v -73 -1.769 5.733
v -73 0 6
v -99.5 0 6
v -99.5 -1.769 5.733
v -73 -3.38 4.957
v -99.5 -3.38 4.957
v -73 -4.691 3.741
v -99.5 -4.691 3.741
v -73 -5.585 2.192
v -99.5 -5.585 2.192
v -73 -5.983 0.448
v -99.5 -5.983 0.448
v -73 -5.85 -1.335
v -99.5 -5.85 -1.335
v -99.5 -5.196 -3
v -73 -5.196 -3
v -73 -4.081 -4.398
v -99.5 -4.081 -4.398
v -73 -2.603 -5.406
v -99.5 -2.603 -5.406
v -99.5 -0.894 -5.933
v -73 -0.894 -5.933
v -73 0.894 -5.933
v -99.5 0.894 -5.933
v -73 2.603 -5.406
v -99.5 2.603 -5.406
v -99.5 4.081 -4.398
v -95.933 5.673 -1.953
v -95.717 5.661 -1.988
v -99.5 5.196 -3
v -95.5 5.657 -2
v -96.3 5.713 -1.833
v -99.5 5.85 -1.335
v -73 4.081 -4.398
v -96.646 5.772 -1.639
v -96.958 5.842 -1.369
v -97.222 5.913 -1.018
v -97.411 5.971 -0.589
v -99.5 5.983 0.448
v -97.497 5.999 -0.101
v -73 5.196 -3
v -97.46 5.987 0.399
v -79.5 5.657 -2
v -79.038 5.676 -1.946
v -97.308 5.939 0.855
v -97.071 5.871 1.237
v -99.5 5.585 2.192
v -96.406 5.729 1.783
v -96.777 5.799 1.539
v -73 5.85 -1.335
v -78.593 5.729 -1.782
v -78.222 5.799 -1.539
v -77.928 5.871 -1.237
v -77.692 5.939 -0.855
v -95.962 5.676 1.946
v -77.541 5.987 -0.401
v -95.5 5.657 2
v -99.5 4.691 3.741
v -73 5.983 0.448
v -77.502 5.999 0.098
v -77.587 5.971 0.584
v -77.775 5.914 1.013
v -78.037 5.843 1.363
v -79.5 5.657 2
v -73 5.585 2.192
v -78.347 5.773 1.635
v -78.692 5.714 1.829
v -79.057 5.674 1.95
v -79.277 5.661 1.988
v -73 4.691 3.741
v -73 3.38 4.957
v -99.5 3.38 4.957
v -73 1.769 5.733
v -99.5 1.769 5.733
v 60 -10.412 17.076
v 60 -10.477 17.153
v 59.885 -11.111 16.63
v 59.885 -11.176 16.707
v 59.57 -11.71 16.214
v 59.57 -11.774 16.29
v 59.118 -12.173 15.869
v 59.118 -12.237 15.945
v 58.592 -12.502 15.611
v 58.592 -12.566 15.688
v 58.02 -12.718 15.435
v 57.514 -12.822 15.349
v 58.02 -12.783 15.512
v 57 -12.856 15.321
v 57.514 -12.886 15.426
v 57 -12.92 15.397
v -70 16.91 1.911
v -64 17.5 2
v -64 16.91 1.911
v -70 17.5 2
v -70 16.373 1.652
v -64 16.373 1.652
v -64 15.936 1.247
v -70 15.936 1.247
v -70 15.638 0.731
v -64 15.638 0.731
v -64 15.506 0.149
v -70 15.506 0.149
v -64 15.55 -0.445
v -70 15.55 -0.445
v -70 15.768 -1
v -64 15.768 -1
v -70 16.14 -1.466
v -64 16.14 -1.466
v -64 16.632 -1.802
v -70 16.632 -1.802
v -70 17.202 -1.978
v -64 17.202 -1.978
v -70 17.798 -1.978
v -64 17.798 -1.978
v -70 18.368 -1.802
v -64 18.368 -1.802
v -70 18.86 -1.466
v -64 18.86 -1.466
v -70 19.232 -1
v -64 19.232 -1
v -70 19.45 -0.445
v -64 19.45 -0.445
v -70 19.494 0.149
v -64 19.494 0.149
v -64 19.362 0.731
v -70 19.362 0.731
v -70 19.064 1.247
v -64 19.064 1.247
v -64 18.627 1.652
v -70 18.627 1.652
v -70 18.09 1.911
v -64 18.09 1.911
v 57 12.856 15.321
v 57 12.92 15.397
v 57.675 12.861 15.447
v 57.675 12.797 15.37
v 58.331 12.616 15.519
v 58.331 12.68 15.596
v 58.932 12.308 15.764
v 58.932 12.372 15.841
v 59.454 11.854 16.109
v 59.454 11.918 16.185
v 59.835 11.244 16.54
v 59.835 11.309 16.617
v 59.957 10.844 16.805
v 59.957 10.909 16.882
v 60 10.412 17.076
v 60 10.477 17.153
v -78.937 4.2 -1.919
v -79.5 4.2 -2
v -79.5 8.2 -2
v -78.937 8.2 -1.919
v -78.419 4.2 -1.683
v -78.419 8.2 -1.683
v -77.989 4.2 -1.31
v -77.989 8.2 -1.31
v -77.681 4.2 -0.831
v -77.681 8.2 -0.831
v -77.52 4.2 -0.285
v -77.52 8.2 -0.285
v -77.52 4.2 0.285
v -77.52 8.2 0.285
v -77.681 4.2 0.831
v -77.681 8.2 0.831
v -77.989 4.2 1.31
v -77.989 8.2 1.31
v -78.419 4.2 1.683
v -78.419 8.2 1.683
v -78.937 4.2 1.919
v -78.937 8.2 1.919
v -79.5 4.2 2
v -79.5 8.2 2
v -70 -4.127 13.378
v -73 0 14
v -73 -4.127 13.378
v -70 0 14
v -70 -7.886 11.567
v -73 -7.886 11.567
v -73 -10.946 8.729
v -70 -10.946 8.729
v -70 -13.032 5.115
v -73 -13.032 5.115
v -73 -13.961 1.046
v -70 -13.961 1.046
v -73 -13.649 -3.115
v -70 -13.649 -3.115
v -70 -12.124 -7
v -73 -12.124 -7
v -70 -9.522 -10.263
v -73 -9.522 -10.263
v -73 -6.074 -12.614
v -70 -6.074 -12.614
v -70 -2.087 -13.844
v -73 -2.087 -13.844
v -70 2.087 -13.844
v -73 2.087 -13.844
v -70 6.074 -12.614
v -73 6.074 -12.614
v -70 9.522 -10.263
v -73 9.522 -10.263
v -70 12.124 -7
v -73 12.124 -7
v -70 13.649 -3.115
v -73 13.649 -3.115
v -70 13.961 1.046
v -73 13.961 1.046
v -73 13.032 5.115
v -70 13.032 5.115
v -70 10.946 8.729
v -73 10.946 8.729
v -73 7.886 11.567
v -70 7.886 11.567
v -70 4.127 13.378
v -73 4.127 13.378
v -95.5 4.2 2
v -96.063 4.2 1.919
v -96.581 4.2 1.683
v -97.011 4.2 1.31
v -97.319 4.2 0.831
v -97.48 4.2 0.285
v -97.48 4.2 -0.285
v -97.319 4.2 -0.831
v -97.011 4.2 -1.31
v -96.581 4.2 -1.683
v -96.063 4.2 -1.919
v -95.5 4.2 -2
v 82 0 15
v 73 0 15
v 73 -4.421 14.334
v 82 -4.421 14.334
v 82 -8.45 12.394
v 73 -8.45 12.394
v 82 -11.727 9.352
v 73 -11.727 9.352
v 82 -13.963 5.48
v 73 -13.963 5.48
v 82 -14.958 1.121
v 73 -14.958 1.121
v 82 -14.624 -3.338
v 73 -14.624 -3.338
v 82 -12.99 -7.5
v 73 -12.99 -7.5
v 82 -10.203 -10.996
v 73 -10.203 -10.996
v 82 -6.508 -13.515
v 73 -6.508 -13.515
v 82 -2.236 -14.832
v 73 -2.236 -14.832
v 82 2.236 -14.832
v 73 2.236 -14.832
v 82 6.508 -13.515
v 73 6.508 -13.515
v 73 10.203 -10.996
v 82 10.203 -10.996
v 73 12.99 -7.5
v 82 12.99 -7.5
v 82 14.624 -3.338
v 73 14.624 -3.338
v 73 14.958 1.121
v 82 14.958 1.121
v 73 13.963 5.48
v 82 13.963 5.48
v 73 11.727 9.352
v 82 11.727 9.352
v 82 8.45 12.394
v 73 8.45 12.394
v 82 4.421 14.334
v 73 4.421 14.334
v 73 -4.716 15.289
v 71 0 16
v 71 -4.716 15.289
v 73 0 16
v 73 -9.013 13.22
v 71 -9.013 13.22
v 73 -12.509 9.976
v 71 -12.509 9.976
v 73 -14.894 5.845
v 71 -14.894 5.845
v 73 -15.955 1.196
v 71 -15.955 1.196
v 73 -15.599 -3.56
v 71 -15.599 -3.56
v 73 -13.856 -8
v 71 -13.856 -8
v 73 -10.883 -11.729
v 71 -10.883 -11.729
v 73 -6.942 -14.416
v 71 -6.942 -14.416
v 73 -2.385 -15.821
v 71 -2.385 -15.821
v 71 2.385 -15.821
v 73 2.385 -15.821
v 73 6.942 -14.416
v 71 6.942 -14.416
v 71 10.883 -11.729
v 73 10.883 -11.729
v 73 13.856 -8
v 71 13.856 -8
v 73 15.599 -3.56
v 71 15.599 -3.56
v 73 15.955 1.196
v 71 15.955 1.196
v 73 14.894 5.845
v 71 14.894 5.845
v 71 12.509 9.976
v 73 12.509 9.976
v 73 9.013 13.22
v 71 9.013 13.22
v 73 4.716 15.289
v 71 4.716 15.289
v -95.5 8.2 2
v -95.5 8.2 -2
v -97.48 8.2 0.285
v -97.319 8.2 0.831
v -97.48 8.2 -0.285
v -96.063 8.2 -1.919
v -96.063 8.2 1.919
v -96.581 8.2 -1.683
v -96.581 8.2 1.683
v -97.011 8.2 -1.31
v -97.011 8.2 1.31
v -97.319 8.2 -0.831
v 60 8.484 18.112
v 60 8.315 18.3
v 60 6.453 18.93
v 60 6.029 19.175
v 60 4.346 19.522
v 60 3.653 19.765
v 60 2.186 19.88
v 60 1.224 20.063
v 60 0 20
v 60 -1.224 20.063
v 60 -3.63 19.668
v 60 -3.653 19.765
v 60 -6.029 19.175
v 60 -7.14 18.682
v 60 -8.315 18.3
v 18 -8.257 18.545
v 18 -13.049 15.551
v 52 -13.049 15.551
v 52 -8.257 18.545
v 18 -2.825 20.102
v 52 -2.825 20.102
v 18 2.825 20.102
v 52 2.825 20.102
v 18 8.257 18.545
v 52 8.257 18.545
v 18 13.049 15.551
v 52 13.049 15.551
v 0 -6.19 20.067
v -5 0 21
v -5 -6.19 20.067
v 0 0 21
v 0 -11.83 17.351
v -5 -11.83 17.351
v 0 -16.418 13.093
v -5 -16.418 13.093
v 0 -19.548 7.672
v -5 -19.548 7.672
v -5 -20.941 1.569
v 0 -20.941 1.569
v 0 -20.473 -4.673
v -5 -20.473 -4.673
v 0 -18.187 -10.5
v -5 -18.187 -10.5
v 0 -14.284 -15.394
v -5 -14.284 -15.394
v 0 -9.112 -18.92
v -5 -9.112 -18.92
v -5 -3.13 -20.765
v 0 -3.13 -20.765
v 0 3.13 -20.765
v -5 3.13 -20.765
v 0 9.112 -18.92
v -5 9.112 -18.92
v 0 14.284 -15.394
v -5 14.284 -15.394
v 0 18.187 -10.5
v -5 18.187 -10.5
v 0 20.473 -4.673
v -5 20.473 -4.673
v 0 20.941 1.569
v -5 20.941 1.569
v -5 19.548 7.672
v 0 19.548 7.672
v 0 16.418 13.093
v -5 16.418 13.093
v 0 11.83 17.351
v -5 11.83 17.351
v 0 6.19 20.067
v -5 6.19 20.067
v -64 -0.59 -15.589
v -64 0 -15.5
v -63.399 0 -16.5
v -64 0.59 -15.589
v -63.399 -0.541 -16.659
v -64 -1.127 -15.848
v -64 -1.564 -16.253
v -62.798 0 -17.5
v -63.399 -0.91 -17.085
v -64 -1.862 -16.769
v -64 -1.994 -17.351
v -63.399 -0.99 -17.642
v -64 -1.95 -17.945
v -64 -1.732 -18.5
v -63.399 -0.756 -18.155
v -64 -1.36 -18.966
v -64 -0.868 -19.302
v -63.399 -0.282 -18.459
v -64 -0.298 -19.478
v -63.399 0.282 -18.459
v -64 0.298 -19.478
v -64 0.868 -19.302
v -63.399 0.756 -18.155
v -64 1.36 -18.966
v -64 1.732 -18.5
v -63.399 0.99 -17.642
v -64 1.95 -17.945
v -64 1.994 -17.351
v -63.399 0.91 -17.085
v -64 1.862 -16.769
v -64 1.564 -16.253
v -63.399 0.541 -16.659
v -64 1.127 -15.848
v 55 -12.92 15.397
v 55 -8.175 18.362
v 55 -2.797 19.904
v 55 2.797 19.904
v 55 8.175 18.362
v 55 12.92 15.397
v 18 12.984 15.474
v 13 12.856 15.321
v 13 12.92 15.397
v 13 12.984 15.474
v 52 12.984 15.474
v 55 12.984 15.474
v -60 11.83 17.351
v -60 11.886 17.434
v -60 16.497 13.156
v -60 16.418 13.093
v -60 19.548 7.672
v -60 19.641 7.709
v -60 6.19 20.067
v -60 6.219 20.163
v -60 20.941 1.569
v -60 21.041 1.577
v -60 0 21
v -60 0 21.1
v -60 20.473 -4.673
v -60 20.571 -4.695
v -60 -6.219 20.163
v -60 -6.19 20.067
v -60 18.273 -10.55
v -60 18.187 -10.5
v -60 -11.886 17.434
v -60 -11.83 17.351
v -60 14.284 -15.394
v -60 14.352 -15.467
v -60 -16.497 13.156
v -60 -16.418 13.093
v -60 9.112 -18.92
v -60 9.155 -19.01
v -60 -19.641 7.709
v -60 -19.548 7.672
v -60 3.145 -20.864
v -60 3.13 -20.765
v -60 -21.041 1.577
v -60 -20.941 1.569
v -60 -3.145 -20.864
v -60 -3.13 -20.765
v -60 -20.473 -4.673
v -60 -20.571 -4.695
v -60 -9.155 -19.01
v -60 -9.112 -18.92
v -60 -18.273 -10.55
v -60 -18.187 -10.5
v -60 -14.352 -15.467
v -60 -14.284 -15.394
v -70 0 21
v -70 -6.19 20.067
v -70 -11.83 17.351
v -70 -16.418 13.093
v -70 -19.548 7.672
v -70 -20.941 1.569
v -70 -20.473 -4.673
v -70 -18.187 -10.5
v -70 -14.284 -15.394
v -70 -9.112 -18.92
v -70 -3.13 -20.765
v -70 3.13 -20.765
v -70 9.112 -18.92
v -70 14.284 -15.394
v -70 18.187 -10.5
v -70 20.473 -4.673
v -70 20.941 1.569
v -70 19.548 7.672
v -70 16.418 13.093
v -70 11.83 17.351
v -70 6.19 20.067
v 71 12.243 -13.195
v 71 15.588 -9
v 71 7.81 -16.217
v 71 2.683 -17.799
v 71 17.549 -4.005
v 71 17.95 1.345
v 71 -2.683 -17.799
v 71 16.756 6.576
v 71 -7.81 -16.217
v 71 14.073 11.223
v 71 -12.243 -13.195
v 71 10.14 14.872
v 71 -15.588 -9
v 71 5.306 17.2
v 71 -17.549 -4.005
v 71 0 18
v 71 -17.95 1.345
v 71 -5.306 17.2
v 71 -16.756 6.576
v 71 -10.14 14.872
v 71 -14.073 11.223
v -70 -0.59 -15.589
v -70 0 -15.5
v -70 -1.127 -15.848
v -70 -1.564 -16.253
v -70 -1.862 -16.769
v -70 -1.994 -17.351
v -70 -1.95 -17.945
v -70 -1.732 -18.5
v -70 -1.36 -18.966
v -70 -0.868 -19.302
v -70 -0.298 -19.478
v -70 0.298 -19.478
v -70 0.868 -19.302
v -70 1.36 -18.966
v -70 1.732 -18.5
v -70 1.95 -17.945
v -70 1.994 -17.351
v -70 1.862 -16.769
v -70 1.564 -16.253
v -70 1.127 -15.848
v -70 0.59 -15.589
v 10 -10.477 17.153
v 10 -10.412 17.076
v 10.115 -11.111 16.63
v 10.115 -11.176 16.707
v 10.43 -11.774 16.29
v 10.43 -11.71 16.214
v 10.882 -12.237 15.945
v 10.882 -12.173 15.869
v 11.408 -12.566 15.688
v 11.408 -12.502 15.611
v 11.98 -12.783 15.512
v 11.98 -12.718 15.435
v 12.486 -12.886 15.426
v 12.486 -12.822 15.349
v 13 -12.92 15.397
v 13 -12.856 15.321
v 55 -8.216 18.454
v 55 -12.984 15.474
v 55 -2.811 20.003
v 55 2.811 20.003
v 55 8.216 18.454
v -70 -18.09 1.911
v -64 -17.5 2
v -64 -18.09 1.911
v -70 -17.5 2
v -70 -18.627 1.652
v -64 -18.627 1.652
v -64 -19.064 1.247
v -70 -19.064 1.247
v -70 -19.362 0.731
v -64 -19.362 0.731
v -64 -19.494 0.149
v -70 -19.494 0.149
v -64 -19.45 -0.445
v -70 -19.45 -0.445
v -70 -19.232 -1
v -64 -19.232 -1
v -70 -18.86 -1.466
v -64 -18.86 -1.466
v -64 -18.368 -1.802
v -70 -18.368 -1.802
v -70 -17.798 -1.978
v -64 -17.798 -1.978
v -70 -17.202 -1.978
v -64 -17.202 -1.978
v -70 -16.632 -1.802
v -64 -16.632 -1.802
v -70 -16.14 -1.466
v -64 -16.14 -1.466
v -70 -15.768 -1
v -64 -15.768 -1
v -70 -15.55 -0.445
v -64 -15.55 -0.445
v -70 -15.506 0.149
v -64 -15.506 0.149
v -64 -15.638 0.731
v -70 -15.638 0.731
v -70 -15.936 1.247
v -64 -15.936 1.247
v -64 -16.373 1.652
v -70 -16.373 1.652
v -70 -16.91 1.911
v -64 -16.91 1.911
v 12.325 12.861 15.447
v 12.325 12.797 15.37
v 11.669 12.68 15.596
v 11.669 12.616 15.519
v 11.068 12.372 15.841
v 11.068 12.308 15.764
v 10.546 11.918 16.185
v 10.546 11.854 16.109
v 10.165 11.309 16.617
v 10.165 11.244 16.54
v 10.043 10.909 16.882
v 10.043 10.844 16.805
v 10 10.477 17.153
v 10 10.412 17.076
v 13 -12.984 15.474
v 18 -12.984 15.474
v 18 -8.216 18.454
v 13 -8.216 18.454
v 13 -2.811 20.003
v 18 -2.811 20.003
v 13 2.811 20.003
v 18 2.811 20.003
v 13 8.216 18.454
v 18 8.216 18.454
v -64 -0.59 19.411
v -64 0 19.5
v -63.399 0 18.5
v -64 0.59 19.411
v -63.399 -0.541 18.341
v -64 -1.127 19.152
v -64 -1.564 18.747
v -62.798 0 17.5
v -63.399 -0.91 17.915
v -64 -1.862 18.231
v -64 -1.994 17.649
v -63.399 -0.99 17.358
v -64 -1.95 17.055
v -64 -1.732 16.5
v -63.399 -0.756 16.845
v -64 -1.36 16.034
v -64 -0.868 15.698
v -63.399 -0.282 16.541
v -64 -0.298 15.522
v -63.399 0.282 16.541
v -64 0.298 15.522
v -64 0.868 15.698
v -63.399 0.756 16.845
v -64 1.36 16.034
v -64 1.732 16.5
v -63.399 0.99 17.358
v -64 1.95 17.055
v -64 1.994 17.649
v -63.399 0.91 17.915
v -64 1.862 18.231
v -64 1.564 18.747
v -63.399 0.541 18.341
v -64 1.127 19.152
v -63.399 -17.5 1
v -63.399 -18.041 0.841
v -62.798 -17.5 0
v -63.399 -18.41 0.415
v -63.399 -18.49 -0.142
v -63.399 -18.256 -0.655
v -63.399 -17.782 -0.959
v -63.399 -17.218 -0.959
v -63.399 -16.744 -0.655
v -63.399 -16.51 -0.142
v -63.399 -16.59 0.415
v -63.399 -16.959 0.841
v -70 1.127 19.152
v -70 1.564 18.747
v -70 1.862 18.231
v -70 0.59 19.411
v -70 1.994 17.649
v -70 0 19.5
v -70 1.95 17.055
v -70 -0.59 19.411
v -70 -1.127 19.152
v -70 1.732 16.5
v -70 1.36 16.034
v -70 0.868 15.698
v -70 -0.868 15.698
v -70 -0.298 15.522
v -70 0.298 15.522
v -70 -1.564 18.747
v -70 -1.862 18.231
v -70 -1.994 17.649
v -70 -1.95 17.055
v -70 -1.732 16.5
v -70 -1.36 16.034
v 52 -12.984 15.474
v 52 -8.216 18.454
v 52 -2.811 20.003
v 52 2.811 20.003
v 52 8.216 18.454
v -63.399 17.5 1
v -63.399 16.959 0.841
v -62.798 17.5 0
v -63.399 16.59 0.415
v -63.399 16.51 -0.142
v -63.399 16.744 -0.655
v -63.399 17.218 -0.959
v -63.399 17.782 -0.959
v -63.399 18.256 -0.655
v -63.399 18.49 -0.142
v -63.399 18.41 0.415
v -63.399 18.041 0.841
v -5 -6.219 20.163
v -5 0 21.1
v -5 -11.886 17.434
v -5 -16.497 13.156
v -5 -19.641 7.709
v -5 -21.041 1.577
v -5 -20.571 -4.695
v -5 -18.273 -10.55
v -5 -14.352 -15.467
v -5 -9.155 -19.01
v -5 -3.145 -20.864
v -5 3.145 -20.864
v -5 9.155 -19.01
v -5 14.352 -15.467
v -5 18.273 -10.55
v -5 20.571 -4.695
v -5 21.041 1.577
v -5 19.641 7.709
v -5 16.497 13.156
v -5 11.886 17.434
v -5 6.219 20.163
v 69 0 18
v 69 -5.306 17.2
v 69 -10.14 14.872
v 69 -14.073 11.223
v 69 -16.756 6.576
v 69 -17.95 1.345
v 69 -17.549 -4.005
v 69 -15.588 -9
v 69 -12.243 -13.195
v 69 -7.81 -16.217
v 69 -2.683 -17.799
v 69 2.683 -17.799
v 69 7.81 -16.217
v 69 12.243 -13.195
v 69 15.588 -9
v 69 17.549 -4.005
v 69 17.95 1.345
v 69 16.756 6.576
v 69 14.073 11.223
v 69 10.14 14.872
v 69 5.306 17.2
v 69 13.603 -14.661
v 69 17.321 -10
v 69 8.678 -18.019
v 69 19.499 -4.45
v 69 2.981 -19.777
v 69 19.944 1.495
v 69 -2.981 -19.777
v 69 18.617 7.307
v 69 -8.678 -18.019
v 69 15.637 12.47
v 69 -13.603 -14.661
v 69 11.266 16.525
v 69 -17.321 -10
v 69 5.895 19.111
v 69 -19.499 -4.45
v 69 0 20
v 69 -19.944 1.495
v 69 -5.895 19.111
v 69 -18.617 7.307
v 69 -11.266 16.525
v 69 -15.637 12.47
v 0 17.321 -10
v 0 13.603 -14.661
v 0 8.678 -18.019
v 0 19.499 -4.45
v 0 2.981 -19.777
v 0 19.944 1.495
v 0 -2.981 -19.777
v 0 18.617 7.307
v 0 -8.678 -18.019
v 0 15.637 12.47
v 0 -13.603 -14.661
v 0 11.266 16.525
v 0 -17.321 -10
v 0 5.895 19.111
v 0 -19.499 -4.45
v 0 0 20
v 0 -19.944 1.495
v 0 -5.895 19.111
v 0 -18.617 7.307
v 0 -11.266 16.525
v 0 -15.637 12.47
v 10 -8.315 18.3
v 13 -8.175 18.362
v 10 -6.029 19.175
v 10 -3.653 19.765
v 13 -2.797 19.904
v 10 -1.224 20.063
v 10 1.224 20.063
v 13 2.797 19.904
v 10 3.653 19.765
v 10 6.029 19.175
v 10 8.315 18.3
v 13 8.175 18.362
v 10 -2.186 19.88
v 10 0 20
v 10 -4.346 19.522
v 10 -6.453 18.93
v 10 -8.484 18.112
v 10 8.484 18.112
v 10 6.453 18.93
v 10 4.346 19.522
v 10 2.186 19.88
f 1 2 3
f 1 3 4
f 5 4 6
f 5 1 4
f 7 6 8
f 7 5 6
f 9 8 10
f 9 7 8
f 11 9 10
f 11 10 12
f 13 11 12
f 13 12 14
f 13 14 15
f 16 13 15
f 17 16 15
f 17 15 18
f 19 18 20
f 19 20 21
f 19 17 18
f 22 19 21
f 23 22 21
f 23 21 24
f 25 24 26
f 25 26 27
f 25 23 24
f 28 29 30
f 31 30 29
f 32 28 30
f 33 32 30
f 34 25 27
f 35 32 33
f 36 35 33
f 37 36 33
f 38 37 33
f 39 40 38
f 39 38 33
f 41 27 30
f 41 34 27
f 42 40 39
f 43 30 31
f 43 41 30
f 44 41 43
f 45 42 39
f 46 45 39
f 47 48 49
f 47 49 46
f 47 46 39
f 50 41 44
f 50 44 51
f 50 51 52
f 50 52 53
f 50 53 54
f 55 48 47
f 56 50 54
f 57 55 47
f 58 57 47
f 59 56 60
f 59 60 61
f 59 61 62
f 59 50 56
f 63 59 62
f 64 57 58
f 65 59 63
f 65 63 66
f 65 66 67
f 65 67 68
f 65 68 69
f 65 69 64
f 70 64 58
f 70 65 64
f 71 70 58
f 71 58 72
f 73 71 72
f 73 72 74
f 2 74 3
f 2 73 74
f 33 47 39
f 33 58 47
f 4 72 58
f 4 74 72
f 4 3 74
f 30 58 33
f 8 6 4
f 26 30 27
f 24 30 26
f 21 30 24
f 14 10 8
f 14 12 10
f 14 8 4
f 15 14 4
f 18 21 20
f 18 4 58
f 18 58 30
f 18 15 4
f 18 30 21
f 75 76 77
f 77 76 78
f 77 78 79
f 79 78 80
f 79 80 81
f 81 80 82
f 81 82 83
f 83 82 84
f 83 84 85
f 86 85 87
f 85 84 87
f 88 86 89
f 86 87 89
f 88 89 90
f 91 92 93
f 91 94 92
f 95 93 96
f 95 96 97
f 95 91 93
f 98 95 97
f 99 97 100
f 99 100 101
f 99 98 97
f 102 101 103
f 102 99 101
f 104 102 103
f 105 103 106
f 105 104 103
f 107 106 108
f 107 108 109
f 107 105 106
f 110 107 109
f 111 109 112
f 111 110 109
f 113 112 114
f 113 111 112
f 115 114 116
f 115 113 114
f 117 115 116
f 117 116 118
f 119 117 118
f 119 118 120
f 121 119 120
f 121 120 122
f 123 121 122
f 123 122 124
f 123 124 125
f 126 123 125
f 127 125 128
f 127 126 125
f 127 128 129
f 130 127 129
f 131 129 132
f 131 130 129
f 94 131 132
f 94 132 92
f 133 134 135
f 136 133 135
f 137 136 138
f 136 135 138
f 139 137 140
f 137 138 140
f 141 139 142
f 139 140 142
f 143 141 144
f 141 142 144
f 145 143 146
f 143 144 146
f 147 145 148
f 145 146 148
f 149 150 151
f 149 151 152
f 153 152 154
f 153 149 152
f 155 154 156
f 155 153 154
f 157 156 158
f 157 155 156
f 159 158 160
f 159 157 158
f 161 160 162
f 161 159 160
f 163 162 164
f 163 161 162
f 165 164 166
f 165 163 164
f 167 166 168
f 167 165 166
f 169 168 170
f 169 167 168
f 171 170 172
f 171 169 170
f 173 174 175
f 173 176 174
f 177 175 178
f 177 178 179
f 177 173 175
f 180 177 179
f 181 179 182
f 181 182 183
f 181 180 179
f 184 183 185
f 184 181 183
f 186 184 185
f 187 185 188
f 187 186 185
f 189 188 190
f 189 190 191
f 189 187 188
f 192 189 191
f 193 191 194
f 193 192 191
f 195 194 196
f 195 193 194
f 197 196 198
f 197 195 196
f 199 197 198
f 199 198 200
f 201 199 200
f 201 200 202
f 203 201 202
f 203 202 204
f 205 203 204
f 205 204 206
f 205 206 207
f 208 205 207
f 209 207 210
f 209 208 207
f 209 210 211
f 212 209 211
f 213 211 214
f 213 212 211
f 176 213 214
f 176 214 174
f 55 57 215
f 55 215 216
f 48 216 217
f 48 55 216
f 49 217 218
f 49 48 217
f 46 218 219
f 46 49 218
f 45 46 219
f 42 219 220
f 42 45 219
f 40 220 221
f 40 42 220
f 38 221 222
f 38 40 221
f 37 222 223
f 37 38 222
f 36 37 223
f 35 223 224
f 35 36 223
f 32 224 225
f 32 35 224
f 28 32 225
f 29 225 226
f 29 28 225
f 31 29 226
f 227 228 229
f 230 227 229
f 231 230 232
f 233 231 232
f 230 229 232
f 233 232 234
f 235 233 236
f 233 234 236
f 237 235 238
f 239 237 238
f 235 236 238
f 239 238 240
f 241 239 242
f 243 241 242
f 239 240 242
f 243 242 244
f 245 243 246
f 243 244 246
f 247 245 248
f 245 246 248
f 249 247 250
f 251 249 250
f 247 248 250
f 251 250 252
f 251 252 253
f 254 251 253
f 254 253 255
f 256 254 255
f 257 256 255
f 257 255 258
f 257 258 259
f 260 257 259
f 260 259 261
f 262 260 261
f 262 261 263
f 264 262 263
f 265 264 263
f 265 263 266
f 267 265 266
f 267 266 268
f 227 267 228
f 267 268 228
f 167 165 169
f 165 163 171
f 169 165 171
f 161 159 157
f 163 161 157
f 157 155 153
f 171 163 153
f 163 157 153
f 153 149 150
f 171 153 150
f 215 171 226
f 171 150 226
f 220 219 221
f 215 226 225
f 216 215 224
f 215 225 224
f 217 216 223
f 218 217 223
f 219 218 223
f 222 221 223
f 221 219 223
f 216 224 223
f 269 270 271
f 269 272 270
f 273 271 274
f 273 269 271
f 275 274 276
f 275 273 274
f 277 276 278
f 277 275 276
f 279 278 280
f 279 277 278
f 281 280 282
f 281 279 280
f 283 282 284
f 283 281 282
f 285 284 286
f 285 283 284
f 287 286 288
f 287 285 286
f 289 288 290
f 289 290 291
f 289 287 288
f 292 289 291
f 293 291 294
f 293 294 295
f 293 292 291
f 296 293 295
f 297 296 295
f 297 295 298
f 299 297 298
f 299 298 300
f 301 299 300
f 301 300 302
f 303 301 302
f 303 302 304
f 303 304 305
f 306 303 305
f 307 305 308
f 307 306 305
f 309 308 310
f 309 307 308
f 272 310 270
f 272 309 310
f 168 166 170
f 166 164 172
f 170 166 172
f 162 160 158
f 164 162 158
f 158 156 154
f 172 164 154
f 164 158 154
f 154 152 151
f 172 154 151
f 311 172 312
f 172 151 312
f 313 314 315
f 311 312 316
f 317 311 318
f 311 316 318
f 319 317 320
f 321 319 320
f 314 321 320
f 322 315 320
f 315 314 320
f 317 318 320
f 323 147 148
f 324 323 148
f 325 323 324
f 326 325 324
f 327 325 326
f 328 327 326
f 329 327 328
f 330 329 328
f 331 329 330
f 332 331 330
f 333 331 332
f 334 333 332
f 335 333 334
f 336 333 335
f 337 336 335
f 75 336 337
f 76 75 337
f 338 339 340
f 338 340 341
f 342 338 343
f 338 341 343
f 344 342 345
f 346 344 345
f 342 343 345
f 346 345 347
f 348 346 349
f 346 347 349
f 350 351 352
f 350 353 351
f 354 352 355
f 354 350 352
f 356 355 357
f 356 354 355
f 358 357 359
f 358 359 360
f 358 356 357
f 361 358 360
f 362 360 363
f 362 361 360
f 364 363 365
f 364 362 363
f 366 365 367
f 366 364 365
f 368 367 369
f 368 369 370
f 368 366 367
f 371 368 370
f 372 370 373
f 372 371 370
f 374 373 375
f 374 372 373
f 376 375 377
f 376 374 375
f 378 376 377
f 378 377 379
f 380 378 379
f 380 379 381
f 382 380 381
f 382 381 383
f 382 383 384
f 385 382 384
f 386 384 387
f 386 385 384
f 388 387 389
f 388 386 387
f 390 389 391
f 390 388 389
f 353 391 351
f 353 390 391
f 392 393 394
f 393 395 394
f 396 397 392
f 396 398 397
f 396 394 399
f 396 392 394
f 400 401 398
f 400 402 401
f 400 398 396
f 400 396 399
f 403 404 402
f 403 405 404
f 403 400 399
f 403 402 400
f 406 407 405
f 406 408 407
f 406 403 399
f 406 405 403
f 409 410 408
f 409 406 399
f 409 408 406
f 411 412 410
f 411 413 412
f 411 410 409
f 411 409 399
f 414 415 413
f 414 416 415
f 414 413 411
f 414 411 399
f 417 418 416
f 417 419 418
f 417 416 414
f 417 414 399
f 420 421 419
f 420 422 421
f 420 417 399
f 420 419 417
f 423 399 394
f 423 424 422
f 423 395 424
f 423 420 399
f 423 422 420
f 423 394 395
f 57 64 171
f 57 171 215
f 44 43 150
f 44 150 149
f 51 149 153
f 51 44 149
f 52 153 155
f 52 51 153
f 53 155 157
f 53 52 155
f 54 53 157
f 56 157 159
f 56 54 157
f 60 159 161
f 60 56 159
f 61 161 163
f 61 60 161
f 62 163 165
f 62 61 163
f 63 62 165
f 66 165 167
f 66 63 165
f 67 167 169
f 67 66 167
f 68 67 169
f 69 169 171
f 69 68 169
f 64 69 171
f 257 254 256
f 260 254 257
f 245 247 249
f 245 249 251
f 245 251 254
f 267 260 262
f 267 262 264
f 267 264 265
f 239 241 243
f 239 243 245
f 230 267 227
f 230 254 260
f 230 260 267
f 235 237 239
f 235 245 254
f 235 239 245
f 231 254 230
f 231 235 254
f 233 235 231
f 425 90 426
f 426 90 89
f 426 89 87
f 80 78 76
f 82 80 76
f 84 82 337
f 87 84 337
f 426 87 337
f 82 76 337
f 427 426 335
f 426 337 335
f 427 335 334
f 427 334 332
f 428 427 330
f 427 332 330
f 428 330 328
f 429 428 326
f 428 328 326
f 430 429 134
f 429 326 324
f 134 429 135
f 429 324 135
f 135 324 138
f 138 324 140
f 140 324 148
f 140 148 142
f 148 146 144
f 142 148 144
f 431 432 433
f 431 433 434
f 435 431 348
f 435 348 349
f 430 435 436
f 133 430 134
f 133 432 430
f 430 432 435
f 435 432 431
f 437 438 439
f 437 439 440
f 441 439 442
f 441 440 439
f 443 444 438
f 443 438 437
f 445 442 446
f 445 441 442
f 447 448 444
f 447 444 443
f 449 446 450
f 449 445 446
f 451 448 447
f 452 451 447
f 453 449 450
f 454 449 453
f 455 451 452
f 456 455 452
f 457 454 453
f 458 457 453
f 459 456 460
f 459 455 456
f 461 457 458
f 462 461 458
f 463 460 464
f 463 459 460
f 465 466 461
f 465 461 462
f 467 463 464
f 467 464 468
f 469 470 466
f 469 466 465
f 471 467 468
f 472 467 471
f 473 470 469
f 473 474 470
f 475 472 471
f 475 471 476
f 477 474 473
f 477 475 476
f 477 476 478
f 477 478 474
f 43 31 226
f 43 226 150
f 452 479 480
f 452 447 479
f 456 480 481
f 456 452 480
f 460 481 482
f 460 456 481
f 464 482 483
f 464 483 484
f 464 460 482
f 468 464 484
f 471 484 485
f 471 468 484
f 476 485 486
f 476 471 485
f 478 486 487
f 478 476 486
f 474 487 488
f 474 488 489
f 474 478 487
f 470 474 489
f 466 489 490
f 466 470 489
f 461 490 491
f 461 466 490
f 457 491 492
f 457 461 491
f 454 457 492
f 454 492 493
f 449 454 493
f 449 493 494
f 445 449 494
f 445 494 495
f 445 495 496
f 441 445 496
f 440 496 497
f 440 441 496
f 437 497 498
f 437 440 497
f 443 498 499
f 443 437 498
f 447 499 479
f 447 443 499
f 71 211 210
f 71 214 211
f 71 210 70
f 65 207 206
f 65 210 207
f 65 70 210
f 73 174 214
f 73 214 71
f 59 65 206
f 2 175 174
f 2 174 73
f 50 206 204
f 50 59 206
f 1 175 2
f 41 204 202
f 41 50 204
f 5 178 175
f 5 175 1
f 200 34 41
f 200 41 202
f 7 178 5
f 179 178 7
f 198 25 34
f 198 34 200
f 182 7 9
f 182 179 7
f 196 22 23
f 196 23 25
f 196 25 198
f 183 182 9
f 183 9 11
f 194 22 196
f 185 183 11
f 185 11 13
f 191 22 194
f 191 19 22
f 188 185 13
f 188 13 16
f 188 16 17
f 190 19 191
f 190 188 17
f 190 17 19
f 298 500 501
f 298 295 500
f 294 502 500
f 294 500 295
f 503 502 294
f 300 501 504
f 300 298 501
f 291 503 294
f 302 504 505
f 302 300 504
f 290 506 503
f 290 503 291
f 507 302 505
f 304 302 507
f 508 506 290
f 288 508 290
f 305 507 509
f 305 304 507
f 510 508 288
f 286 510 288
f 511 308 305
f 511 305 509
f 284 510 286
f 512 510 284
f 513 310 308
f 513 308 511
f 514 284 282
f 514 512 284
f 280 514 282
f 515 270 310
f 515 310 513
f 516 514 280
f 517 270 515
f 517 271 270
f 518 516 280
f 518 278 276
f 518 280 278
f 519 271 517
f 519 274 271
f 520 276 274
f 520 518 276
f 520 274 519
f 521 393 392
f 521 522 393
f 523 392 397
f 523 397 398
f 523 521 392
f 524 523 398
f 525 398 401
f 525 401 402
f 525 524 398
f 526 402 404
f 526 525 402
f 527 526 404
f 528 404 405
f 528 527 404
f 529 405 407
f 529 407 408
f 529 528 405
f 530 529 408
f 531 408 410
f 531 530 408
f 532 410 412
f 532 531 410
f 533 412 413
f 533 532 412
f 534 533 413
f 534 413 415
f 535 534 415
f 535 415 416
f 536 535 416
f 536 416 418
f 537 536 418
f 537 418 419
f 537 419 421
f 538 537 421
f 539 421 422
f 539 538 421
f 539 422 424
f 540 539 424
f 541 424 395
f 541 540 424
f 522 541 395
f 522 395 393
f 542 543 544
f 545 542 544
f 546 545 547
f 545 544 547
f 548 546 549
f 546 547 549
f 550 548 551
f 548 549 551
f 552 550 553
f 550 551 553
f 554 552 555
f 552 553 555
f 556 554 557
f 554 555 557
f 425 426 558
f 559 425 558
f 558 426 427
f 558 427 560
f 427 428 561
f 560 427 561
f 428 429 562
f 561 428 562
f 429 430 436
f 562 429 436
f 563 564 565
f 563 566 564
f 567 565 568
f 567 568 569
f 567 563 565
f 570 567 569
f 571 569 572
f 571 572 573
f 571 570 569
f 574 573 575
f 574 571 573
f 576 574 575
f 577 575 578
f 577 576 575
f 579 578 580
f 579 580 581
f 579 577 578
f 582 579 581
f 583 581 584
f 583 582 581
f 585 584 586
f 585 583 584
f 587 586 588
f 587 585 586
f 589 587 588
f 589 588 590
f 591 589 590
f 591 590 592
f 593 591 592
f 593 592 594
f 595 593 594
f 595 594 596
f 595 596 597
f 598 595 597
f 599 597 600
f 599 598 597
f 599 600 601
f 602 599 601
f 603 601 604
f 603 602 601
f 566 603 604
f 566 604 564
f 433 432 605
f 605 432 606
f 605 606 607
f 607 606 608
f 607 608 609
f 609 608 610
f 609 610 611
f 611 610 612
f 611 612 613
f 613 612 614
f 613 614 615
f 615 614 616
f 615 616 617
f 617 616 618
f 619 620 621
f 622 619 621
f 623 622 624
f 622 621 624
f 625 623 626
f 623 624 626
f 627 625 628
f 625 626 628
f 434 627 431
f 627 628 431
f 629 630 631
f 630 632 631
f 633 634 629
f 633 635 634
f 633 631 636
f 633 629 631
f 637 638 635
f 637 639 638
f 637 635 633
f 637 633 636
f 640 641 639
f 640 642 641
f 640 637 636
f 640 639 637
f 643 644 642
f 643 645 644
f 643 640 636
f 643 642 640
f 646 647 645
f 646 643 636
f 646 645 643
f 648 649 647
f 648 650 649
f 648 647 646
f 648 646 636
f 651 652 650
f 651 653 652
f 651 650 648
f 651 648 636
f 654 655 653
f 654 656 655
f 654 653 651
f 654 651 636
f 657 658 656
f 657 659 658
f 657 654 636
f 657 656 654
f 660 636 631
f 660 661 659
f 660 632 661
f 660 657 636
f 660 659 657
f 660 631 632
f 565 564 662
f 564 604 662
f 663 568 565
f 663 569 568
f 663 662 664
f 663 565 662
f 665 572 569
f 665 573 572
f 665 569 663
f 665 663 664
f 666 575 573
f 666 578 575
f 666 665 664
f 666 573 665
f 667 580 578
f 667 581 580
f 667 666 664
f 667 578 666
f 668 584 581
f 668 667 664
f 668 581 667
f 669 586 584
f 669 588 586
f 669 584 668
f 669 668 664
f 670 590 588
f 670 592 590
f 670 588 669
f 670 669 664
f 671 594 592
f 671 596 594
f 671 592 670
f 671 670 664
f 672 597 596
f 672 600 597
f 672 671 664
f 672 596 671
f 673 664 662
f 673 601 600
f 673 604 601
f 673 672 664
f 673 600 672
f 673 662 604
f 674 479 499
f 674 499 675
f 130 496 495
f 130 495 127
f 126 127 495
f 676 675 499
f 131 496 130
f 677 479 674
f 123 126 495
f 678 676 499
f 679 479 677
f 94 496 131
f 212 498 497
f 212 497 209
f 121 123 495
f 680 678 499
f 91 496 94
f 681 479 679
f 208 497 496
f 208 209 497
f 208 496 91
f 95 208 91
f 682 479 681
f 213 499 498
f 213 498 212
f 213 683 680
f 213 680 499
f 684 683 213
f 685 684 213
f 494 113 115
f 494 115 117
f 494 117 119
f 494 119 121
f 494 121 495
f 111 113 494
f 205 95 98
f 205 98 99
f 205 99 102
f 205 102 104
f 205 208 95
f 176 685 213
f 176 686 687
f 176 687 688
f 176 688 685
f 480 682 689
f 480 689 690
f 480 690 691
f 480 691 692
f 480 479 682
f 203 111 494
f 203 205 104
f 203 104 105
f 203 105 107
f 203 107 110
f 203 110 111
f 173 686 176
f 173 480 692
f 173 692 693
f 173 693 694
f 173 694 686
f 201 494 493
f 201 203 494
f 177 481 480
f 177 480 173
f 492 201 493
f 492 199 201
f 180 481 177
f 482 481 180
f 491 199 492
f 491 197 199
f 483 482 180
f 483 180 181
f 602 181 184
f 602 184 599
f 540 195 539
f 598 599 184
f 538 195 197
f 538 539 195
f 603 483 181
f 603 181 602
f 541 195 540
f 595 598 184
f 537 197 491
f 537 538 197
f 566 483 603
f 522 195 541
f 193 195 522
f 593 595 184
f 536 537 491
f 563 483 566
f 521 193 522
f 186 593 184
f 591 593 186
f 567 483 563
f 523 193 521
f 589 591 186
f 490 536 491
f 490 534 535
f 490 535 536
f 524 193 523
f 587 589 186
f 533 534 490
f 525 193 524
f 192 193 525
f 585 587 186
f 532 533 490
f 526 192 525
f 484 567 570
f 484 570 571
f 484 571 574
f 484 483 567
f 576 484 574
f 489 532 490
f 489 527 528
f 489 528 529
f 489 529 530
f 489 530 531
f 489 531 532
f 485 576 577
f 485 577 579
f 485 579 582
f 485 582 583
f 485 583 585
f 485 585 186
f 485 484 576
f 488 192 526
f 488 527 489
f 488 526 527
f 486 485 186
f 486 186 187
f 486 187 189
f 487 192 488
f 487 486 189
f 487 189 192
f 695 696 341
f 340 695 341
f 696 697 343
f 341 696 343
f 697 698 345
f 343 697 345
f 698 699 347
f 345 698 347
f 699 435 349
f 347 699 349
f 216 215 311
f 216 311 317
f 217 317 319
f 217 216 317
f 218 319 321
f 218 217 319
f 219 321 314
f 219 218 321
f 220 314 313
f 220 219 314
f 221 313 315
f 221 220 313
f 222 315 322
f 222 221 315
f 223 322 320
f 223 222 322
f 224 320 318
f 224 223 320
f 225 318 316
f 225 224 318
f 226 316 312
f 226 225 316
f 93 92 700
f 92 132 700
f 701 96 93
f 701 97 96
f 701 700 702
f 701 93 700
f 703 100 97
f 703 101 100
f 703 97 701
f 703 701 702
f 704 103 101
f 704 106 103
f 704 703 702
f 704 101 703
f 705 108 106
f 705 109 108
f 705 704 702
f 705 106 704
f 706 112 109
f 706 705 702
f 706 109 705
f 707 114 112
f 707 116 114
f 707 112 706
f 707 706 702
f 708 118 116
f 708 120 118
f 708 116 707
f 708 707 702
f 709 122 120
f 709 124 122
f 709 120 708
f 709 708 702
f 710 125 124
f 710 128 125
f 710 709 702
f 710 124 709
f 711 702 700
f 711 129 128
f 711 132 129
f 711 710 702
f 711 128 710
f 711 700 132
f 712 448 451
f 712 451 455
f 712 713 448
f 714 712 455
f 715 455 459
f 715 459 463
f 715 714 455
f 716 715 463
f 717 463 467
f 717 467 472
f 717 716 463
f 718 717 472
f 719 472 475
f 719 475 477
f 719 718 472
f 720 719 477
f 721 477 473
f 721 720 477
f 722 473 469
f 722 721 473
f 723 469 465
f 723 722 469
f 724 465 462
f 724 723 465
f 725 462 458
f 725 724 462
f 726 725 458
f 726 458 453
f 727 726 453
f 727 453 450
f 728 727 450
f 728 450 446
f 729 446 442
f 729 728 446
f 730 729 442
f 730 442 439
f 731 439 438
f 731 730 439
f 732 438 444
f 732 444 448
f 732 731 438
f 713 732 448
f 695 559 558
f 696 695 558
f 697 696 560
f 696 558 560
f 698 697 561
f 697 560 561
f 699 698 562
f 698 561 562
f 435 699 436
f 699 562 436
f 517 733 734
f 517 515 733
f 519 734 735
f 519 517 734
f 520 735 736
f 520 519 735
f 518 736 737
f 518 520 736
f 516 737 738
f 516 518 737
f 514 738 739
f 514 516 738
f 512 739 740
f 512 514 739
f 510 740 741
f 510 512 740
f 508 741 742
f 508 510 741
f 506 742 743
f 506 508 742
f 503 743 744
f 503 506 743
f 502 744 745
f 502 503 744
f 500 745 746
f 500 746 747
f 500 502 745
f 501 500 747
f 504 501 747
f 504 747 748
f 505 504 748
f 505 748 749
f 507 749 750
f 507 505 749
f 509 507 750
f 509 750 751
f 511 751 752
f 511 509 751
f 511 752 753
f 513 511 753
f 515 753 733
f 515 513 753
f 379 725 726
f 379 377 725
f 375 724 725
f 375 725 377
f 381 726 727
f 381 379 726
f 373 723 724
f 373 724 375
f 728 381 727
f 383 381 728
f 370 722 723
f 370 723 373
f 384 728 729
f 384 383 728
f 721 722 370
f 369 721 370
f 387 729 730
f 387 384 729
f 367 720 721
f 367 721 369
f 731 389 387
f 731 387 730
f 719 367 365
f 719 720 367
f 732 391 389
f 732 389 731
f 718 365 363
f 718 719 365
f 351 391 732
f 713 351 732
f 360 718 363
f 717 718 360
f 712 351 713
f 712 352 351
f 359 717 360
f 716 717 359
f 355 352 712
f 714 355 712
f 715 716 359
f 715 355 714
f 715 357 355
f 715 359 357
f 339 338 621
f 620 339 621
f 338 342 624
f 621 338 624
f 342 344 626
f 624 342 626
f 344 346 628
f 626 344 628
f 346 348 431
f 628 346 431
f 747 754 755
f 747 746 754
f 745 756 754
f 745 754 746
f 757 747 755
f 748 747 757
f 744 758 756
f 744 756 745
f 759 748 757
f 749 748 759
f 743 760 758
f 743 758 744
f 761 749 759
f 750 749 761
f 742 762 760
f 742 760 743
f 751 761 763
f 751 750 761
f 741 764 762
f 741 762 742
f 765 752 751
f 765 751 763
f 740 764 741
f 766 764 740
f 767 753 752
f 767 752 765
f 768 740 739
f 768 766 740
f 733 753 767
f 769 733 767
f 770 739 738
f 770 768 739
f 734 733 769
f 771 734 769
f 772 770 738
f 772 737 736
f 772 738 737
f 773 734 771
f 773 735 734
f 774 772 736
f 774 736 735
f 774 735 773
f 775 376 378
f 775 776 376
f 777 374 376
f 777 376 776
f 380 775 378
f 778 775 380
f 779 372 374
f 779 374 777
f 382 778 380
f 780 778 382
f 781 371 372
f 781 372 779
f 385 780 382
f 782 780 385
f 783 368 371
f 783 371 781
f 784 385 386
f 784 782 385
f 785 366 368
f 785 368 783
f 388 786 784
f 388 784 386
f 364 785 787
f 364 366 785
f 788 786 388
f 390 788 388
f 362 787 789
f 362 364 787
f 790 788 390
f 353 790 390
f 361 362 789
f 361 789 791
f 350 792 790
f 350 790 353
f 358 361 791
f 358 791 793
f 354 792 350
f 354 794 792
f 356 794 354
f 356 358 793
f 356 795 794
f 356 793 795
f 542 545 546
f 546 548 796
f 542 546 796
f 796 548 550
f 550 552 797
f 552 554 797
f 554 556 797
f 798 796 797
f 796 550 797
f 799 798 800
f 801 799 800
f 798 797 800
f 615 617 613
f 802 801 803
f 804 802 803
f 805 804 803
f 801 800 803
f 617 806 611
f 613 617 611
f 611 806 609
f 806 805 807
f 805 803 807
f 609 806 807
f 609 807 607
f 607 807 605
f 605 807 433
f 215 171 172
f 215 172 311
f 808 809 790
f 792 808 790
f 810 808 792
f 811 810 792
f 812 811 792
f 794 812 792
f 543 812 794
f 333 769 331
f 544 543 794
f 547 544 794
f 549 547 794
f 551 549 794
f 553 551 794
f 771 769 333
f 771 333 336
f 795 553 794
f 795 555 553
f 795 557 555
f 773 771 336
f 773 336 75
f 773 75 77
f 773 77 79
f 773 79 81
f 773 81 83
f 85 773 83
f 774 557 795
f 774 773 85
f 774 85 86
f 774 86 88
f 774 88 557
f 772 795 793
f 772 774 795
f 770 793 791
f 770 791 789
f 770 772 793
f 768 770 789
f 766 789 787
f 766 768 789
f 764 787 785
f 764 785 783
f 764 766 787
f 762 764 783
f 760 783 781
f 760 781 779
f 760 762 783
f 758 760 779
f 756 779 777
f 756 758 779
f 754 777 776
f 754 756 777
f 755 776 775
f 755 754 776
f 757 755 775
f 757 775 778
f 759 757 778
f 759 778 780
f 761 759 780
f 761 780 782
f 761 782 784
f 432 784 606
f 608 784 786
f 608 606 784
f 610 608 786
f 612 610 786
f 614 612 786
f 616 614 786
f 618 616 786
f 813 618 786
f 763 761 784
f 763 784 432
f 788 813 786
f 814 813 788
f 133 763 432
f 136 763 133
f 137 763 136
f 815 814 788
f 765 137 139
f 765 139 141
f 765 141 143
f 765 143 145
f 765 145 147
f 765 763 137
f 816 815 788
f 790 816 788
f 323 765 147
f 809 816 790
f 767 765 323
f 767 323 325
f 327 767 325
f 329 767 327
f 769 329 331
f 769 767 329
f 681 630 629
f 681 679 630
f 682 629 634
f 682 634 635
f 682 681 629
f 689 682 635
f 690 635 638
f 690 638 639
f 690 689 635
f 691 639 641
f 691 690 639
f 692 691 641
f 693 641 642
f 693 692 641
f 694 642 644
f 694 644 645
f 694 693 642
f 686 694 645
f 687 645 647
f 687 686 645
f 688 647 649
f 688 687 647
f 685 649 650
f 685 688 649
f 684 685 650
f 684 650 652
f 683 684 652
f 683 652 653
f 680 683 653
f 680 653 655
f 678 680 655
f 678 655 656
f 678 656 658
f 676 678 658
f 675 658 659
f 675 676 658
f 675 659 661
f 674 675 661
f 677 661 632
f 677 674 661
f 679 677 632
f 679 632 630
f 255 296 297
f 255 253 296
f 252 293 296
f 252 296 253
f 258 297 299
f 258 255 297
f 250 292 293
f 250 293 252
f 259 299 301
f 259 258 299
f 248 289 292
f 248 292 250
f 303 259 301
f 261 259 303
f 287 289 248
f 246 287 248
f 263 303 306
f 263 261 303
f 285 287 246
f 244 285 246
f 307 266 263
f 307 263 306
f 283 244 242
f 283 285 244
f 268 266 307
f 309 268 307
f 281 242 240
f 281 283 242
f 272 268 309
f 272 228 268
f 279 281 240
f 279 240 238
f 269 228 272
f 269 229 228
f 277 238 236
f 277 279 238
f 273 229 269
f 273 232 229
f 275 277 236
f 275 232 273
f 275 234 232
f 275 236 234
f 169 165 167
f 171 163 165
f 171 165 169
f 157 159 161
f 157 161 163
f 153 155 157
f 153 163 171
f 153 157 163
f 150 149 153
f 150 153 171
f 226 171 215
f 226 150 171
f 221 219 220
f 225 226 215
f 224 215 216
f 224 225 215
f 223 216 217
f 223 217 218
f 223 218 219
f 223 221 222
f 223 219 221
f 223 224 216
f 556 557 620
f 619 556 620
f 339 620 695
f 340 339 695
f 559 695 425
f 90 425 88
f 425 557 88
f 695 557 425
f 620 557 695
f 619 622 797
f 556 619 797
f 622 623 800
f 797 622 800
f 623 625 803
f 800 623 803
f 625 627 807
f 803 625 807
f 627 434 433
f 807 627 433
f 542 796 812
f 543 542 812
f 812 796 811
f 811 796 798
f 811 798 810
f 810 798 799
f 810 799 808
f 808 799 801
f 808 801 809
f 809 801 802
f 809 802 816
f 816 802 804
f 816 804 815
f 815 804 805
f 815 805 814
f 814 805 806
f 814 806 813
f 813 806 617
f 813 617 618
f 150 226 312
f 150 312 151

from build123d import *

# Parameters (mm, degrees)
SKETCH_2_R                     = 15
EXTRUDE_1_DEPTH                = 9
CUT_EXTRUDE_START              = 6
CUT_EXTRUDE_1_DEPTH            = 1.8
EXTRUDE_3_DEPTH                = 2.2
EXTRUDE_3_DEPTH_BACK           = 1.8
EXTRUDE_3_START                = 6
REVOLVE_2_ANGLE                = 40
REVOLVE_2_OTHER_WAY_ANGLE      = 40
FILLET_1_R                     = 3
HOLE_WIZARD_4_0_4_1_AT_2_COUNT = 2
HOLE_WIZARD_4_0_4_1_AT_2_PITCH = 24.748737342
HOLE_WIZARD_4_0_4_1_AT_3_COUNT = 2
HOLE_WIZARD_4_0_4_1_AT_3_PITCH = 35
HOLE_WIZARD_4_0_4_1_AT_4_COUNT = 2
HOLE_WIZARD_4_0_4_1_AT_4_PITCH = 24.748737342


with BuildPart() as part:
    # ｽｹｯﾁ1 → 回転1 (revolve)
    with BuildSketch(Plane.XY, mode=Mode.PRIVATE) as revolve_1_sk:
        Polygon((-99.5, 0), (-99.5, 6), (-73, 6), (-73, 14), (-70, 14), (-70, 21), (-60, 21), (-60, 21.1), (-5, 21.1), (-5, 21), (0, 21), (0, 20), (69, 20), (69, 18), (71, 18), (71, 16), (73, 16), (73, 0), align=None)
    revolve(revolve_1_sk.sketch.rotate(Axis((-67.500540801, 0, 0), (1, 0, 0)), 90), axis=Axis((-67.500540801, 0, 0), (1, 0, 0)))

    # ｽｹｯﾁ2 → ﾎﾞｽ - 押し出し1 (add)
    with BuildSketch(Plane(origin=(73, 0, 0), x_dir=(0, 0, -1), z_dir=(1, 0, 0))):
        with Locations(Location((0, 0, 0), (0, 0, 180))):
            Circle(SKETCH_2_R)
    extrude(amount=EXTRUDE_1_DEPTH)

    # ｽｹｯﾁ3 → ｶｯﾄ - 押し出し1 (cut)
    with BuildSketch(Plane(origin=(0, 0, 0), x_dir=(1, 0, 0), z_dir=(0, 1, 0)).offset(CUT_EXTRUDE_START)):
        with BuildLine():
            Line((-95.5, 2), (-79.5, 2))
            ThreePointArc((-79.5, 2), (-77.5, 0), (-79.5, -2))
            Line((-79.5, -2), (-95.5, -2))
            ThreePointArc((-95.5, -2), (-97.5, 0), (-95.5, 2))
        make_face()
    extrude(amount=-CUT_EXTRUDE_1_DEPTH, mode=Mode.SUBTRACT)

    # ｽｹｯﾁ7 → 回転2 (revolve)
    with BuildSketch(Plane(origin=(0, 0, 0), x_dir=(1, 0, 0), z_dir=(0, 1, 0))):
        Polygon((10, -20), (10, -20.1), (13, -20.1), (13, -20.2), (18, -20.2), (18, -20.3), (52, -20.3), (52, -20.2), (55, -20.2), (55, -20.1), (60, -20.1), (60, -20), align=None)
    revolve(axis=Axis((0, 0, 0), (1, 0, 0)), revolution_arc=REVOLVE_2_ANGLE)

    # ｽｹｯﾁ7 → 回転2 other way (revolve)
    with BuildSketch(Plane(origin=(0, 0, 0), x_dir=(1, 0, 0), z_dir=(0, 1, 0))):
        Polygon((10, -20), (10, -20.1), (13, -20.1), (13, -20.2), (18, -20.2), (18, -20.3), (52, -20.3), (52, -20.2), (55, -20.2), (55, -20.1), (60, -20.1), (60, -20), align=None)
    revolve(axis=Axis((0, 0, 0), (-1, 0, 0)), revolution_arc=REVOLVE_2_OTHER_WAY_ANGLE)

    # ﾌｨﾚｯﾄ1
    # the kernel refuses this fillet: 3 mm, written as the material it takes off along each edge
    with BuildSketch(Plane(origin=(10, -8.034845121, 9.575555539), x_dir=(1, 0, 0), z_dir=(-1.7763568394002255e-14, -0.6427876096865406, 0.7660444431189771))) as fillet_1_piece_1_section:
        with BuildLine():
            CenterArc((FILLET_1_R, FILLET_1_R), FILLET_1_R, 180, 90)
            Line((0, FILLET_1_R), (0, 0))
            Line((0, 0), (FILLET_1_R, 0))
        make_face()
    fillet_1_piece_1 = extrude(amount=15.1, mode=Mode.PRIVATE)
    fillet_1_piece_1 = fillet_1_piece_1 - Plane(origin=(10.677750836, 0, 0), x_dir=(0, 0, 1), z_dir=(1, 0, 0)) * Cylinder(20, 43, mode=Mode.PRIVATE)
    add(fillet_1_piece_1, mode=Mode.SUBTRACT)
    with BuildSketch(Plane(origin=(60, -17.740938027, 21.14282663), x_dir=(0, 0.766044443118977, 0.6427876096865406), z_dir=(-7.105427357601155e-14, 0.6427876096865406, -0.7660444431189771))) as fillet_1_piece_2_section:
        with BuildLine():
            CenterArc((FILLET_1_R, -FILLET_1_R), FILLET_1_R, 90, 90)
            Line((0, -FILLET_1_R), (0, 0))
            Line((0, 0), (FILLET_1_R, 0))
        make_face()
    fillet_1_piece_2 = extrude(amount=15.1, mode=Mode.PRIVATE)
    fillet_1_piece_2 = fillet_1_piece_2 - Plane(origin=(59.322254473, 0, 0), x_dir=(0, 0, 1), z_dir=(1, 0, 0)) * Cylinder(20, 43, mode=Mode.PRIVATE)
    add(fillet_1_piece_2, mode=Mode.SUBTRACT)
    with BuildSketch(Plane(origin=(10, 8.034845121, 9.575555539), x_dir=(1, 0, 0), z_dir=(-1.7763568394002255e-14, 0.6427876096865406, 0.7660444431189771))) as fillet_1_piece_3_section:
        with BuildLine():
            CenterArc((FILLET_1_R, -FILLET_1_R), FILLET_1_R, 90, 90)
            Line((0, -FILLET_1_R), (0, 0))
            Line((0, 0), (FILLET_1_R, 0))
        make_face()
    fillet_1_piece_3 = extrude(amount=15.1, mode=Mode.PRIVATE)
    fillet_1_piece_3 = fillet_1_piece_3 - Plane(origin=(10.677751865, 0, 0), x_dir=(0, 0, 1), z_dir=(1, 0, 0)) * Cylinder(20, 43, mode=Mode.PRIVATE)
    add(fillet_1_piece_3, mode=Mode.SUBTRACT)
    with BuildSketch(Plane(origin=(60, 17.740938027, 21.14282663), x_dir=(-1, 0, 0), z_dir=(-7.105427357601155e-14, -0.6427876096865406, -0.7660444431189771))) as fillet_1_piece_4_section:
        with BuildLine():
            CenterArc((FILLET_1_R, -FILLET_1_R), FILLET_1_R, 90, 90)
            Line((0, -FILLET_1_R), (0, 0))
            Line((0, 0), (FILLET_1_R, 0))
        make_face()
    fillet_1_piece_4 = extrude(amount=15.1, mode=Mode.PRIVATE)
    fillet_1_piece_4 = fillet_1_piece_4 - Plane(origin=(59.322248135, 0, 0), x_dir=(0, 0, 1), z_dir=(1, 0, 0)) * Cylinder(20, 43, mode=Mode.PRIVATE)
    add(fillet_1_piece_4, mode=Mode.SUBTRACT)

    # ｽｹｯﾁ9 → Ø4.0 (4) 直径の穴1 (revolve, cut)
    with BuildSketch(Plane(origin=(-70, 17.5, 0), x_dir=(0, 0, 1), z_dir=(0, 1, 0))):
        Polygon((0, 0), (0, 7.201721238), (2, 6), (2, 0), align=None)
    hole_wizard_4_0_4_1 = revolve(axis=Axis((-76.35, 17.5, 0), (1, 0, 0)), mode=Mode.SUBTRACT)

    # Ø4.0 (4) 直径の穴1 at 2: Ø4.0 (4) 直径の穴1 ×2
    with Locations(*[Vector(0, -0.7071067811865476, -0.7071067811865476) * (i * HOLE_WIZARD_4_0_4_1_AT_2_PITCH) for i in range(1, HOLE_WIZARD_4_0_4_1_AT_2_COUNT)]):
        add(hole_wizard_4_0_4_1, mode=Mode.SUBTRACT)

    # Ø4.0 (4) 直径の穴1 at 3: Ø4.0 (4) 直径の穴1 ×2
    with Locations(*[(0, -i * HOLE_WIZARD_4_0_4_1_AT_3_PITCH, 0) for i in range(1, HOLE_WIZARD_4_0_4_1_AT_3_COUNT)]):
        add(hole_wizard_4_0_4_1, mode=Mode.SUBTRACT)

    # Ø4.0 (4) 直径の穴1 at 4: Ø4.0 (4) 直径の穴1 ×2
    with Locations(*[Vector(0, -0.7071067811865476, 0.7071067811865476) * (i * HOLE_WIZARD_4_0_4_1_AT_4_PITCH) for i in range(1, HOLE_WIZARD_4_0_4_1_AT_4_COUNT)]):
        add(hole_wizard_4_0_4_1, mode=Mode.SUBTRACT)


with BuildPart() as body_2:
    # ｽｹｯﾁ3<2> → ﾎﾞｽ - 押し出し3 (new, two sides: drawn at the far end of the back side and taken through both)
    with BuildSketch(Plane(origin=(0, 0, 0), x_dir=(1, 0, 0), z_dir=(0, 1, 0)).offset(EXTRUDE_3_START - EXTRUDE_3_DEPTH_BACK)):
        with BuildLine():
            Line((-95.5, 2), (-79.5, 2))
            ThreePointArc((-79.5, 2), (-77.5, 0), (-79.5, -2))
            Line((-79.5, -2), (-95.5, -2))
            ThreePointArc((-95.5, -2), (-97.5, 0), (-95.5, 2))
        make_face()
    extrude(amount=EXTRUDE_3_DEPTH + EXTRUDE_3_DEPTH_BACK)


solid = Compound([part.part, body_2.part])
